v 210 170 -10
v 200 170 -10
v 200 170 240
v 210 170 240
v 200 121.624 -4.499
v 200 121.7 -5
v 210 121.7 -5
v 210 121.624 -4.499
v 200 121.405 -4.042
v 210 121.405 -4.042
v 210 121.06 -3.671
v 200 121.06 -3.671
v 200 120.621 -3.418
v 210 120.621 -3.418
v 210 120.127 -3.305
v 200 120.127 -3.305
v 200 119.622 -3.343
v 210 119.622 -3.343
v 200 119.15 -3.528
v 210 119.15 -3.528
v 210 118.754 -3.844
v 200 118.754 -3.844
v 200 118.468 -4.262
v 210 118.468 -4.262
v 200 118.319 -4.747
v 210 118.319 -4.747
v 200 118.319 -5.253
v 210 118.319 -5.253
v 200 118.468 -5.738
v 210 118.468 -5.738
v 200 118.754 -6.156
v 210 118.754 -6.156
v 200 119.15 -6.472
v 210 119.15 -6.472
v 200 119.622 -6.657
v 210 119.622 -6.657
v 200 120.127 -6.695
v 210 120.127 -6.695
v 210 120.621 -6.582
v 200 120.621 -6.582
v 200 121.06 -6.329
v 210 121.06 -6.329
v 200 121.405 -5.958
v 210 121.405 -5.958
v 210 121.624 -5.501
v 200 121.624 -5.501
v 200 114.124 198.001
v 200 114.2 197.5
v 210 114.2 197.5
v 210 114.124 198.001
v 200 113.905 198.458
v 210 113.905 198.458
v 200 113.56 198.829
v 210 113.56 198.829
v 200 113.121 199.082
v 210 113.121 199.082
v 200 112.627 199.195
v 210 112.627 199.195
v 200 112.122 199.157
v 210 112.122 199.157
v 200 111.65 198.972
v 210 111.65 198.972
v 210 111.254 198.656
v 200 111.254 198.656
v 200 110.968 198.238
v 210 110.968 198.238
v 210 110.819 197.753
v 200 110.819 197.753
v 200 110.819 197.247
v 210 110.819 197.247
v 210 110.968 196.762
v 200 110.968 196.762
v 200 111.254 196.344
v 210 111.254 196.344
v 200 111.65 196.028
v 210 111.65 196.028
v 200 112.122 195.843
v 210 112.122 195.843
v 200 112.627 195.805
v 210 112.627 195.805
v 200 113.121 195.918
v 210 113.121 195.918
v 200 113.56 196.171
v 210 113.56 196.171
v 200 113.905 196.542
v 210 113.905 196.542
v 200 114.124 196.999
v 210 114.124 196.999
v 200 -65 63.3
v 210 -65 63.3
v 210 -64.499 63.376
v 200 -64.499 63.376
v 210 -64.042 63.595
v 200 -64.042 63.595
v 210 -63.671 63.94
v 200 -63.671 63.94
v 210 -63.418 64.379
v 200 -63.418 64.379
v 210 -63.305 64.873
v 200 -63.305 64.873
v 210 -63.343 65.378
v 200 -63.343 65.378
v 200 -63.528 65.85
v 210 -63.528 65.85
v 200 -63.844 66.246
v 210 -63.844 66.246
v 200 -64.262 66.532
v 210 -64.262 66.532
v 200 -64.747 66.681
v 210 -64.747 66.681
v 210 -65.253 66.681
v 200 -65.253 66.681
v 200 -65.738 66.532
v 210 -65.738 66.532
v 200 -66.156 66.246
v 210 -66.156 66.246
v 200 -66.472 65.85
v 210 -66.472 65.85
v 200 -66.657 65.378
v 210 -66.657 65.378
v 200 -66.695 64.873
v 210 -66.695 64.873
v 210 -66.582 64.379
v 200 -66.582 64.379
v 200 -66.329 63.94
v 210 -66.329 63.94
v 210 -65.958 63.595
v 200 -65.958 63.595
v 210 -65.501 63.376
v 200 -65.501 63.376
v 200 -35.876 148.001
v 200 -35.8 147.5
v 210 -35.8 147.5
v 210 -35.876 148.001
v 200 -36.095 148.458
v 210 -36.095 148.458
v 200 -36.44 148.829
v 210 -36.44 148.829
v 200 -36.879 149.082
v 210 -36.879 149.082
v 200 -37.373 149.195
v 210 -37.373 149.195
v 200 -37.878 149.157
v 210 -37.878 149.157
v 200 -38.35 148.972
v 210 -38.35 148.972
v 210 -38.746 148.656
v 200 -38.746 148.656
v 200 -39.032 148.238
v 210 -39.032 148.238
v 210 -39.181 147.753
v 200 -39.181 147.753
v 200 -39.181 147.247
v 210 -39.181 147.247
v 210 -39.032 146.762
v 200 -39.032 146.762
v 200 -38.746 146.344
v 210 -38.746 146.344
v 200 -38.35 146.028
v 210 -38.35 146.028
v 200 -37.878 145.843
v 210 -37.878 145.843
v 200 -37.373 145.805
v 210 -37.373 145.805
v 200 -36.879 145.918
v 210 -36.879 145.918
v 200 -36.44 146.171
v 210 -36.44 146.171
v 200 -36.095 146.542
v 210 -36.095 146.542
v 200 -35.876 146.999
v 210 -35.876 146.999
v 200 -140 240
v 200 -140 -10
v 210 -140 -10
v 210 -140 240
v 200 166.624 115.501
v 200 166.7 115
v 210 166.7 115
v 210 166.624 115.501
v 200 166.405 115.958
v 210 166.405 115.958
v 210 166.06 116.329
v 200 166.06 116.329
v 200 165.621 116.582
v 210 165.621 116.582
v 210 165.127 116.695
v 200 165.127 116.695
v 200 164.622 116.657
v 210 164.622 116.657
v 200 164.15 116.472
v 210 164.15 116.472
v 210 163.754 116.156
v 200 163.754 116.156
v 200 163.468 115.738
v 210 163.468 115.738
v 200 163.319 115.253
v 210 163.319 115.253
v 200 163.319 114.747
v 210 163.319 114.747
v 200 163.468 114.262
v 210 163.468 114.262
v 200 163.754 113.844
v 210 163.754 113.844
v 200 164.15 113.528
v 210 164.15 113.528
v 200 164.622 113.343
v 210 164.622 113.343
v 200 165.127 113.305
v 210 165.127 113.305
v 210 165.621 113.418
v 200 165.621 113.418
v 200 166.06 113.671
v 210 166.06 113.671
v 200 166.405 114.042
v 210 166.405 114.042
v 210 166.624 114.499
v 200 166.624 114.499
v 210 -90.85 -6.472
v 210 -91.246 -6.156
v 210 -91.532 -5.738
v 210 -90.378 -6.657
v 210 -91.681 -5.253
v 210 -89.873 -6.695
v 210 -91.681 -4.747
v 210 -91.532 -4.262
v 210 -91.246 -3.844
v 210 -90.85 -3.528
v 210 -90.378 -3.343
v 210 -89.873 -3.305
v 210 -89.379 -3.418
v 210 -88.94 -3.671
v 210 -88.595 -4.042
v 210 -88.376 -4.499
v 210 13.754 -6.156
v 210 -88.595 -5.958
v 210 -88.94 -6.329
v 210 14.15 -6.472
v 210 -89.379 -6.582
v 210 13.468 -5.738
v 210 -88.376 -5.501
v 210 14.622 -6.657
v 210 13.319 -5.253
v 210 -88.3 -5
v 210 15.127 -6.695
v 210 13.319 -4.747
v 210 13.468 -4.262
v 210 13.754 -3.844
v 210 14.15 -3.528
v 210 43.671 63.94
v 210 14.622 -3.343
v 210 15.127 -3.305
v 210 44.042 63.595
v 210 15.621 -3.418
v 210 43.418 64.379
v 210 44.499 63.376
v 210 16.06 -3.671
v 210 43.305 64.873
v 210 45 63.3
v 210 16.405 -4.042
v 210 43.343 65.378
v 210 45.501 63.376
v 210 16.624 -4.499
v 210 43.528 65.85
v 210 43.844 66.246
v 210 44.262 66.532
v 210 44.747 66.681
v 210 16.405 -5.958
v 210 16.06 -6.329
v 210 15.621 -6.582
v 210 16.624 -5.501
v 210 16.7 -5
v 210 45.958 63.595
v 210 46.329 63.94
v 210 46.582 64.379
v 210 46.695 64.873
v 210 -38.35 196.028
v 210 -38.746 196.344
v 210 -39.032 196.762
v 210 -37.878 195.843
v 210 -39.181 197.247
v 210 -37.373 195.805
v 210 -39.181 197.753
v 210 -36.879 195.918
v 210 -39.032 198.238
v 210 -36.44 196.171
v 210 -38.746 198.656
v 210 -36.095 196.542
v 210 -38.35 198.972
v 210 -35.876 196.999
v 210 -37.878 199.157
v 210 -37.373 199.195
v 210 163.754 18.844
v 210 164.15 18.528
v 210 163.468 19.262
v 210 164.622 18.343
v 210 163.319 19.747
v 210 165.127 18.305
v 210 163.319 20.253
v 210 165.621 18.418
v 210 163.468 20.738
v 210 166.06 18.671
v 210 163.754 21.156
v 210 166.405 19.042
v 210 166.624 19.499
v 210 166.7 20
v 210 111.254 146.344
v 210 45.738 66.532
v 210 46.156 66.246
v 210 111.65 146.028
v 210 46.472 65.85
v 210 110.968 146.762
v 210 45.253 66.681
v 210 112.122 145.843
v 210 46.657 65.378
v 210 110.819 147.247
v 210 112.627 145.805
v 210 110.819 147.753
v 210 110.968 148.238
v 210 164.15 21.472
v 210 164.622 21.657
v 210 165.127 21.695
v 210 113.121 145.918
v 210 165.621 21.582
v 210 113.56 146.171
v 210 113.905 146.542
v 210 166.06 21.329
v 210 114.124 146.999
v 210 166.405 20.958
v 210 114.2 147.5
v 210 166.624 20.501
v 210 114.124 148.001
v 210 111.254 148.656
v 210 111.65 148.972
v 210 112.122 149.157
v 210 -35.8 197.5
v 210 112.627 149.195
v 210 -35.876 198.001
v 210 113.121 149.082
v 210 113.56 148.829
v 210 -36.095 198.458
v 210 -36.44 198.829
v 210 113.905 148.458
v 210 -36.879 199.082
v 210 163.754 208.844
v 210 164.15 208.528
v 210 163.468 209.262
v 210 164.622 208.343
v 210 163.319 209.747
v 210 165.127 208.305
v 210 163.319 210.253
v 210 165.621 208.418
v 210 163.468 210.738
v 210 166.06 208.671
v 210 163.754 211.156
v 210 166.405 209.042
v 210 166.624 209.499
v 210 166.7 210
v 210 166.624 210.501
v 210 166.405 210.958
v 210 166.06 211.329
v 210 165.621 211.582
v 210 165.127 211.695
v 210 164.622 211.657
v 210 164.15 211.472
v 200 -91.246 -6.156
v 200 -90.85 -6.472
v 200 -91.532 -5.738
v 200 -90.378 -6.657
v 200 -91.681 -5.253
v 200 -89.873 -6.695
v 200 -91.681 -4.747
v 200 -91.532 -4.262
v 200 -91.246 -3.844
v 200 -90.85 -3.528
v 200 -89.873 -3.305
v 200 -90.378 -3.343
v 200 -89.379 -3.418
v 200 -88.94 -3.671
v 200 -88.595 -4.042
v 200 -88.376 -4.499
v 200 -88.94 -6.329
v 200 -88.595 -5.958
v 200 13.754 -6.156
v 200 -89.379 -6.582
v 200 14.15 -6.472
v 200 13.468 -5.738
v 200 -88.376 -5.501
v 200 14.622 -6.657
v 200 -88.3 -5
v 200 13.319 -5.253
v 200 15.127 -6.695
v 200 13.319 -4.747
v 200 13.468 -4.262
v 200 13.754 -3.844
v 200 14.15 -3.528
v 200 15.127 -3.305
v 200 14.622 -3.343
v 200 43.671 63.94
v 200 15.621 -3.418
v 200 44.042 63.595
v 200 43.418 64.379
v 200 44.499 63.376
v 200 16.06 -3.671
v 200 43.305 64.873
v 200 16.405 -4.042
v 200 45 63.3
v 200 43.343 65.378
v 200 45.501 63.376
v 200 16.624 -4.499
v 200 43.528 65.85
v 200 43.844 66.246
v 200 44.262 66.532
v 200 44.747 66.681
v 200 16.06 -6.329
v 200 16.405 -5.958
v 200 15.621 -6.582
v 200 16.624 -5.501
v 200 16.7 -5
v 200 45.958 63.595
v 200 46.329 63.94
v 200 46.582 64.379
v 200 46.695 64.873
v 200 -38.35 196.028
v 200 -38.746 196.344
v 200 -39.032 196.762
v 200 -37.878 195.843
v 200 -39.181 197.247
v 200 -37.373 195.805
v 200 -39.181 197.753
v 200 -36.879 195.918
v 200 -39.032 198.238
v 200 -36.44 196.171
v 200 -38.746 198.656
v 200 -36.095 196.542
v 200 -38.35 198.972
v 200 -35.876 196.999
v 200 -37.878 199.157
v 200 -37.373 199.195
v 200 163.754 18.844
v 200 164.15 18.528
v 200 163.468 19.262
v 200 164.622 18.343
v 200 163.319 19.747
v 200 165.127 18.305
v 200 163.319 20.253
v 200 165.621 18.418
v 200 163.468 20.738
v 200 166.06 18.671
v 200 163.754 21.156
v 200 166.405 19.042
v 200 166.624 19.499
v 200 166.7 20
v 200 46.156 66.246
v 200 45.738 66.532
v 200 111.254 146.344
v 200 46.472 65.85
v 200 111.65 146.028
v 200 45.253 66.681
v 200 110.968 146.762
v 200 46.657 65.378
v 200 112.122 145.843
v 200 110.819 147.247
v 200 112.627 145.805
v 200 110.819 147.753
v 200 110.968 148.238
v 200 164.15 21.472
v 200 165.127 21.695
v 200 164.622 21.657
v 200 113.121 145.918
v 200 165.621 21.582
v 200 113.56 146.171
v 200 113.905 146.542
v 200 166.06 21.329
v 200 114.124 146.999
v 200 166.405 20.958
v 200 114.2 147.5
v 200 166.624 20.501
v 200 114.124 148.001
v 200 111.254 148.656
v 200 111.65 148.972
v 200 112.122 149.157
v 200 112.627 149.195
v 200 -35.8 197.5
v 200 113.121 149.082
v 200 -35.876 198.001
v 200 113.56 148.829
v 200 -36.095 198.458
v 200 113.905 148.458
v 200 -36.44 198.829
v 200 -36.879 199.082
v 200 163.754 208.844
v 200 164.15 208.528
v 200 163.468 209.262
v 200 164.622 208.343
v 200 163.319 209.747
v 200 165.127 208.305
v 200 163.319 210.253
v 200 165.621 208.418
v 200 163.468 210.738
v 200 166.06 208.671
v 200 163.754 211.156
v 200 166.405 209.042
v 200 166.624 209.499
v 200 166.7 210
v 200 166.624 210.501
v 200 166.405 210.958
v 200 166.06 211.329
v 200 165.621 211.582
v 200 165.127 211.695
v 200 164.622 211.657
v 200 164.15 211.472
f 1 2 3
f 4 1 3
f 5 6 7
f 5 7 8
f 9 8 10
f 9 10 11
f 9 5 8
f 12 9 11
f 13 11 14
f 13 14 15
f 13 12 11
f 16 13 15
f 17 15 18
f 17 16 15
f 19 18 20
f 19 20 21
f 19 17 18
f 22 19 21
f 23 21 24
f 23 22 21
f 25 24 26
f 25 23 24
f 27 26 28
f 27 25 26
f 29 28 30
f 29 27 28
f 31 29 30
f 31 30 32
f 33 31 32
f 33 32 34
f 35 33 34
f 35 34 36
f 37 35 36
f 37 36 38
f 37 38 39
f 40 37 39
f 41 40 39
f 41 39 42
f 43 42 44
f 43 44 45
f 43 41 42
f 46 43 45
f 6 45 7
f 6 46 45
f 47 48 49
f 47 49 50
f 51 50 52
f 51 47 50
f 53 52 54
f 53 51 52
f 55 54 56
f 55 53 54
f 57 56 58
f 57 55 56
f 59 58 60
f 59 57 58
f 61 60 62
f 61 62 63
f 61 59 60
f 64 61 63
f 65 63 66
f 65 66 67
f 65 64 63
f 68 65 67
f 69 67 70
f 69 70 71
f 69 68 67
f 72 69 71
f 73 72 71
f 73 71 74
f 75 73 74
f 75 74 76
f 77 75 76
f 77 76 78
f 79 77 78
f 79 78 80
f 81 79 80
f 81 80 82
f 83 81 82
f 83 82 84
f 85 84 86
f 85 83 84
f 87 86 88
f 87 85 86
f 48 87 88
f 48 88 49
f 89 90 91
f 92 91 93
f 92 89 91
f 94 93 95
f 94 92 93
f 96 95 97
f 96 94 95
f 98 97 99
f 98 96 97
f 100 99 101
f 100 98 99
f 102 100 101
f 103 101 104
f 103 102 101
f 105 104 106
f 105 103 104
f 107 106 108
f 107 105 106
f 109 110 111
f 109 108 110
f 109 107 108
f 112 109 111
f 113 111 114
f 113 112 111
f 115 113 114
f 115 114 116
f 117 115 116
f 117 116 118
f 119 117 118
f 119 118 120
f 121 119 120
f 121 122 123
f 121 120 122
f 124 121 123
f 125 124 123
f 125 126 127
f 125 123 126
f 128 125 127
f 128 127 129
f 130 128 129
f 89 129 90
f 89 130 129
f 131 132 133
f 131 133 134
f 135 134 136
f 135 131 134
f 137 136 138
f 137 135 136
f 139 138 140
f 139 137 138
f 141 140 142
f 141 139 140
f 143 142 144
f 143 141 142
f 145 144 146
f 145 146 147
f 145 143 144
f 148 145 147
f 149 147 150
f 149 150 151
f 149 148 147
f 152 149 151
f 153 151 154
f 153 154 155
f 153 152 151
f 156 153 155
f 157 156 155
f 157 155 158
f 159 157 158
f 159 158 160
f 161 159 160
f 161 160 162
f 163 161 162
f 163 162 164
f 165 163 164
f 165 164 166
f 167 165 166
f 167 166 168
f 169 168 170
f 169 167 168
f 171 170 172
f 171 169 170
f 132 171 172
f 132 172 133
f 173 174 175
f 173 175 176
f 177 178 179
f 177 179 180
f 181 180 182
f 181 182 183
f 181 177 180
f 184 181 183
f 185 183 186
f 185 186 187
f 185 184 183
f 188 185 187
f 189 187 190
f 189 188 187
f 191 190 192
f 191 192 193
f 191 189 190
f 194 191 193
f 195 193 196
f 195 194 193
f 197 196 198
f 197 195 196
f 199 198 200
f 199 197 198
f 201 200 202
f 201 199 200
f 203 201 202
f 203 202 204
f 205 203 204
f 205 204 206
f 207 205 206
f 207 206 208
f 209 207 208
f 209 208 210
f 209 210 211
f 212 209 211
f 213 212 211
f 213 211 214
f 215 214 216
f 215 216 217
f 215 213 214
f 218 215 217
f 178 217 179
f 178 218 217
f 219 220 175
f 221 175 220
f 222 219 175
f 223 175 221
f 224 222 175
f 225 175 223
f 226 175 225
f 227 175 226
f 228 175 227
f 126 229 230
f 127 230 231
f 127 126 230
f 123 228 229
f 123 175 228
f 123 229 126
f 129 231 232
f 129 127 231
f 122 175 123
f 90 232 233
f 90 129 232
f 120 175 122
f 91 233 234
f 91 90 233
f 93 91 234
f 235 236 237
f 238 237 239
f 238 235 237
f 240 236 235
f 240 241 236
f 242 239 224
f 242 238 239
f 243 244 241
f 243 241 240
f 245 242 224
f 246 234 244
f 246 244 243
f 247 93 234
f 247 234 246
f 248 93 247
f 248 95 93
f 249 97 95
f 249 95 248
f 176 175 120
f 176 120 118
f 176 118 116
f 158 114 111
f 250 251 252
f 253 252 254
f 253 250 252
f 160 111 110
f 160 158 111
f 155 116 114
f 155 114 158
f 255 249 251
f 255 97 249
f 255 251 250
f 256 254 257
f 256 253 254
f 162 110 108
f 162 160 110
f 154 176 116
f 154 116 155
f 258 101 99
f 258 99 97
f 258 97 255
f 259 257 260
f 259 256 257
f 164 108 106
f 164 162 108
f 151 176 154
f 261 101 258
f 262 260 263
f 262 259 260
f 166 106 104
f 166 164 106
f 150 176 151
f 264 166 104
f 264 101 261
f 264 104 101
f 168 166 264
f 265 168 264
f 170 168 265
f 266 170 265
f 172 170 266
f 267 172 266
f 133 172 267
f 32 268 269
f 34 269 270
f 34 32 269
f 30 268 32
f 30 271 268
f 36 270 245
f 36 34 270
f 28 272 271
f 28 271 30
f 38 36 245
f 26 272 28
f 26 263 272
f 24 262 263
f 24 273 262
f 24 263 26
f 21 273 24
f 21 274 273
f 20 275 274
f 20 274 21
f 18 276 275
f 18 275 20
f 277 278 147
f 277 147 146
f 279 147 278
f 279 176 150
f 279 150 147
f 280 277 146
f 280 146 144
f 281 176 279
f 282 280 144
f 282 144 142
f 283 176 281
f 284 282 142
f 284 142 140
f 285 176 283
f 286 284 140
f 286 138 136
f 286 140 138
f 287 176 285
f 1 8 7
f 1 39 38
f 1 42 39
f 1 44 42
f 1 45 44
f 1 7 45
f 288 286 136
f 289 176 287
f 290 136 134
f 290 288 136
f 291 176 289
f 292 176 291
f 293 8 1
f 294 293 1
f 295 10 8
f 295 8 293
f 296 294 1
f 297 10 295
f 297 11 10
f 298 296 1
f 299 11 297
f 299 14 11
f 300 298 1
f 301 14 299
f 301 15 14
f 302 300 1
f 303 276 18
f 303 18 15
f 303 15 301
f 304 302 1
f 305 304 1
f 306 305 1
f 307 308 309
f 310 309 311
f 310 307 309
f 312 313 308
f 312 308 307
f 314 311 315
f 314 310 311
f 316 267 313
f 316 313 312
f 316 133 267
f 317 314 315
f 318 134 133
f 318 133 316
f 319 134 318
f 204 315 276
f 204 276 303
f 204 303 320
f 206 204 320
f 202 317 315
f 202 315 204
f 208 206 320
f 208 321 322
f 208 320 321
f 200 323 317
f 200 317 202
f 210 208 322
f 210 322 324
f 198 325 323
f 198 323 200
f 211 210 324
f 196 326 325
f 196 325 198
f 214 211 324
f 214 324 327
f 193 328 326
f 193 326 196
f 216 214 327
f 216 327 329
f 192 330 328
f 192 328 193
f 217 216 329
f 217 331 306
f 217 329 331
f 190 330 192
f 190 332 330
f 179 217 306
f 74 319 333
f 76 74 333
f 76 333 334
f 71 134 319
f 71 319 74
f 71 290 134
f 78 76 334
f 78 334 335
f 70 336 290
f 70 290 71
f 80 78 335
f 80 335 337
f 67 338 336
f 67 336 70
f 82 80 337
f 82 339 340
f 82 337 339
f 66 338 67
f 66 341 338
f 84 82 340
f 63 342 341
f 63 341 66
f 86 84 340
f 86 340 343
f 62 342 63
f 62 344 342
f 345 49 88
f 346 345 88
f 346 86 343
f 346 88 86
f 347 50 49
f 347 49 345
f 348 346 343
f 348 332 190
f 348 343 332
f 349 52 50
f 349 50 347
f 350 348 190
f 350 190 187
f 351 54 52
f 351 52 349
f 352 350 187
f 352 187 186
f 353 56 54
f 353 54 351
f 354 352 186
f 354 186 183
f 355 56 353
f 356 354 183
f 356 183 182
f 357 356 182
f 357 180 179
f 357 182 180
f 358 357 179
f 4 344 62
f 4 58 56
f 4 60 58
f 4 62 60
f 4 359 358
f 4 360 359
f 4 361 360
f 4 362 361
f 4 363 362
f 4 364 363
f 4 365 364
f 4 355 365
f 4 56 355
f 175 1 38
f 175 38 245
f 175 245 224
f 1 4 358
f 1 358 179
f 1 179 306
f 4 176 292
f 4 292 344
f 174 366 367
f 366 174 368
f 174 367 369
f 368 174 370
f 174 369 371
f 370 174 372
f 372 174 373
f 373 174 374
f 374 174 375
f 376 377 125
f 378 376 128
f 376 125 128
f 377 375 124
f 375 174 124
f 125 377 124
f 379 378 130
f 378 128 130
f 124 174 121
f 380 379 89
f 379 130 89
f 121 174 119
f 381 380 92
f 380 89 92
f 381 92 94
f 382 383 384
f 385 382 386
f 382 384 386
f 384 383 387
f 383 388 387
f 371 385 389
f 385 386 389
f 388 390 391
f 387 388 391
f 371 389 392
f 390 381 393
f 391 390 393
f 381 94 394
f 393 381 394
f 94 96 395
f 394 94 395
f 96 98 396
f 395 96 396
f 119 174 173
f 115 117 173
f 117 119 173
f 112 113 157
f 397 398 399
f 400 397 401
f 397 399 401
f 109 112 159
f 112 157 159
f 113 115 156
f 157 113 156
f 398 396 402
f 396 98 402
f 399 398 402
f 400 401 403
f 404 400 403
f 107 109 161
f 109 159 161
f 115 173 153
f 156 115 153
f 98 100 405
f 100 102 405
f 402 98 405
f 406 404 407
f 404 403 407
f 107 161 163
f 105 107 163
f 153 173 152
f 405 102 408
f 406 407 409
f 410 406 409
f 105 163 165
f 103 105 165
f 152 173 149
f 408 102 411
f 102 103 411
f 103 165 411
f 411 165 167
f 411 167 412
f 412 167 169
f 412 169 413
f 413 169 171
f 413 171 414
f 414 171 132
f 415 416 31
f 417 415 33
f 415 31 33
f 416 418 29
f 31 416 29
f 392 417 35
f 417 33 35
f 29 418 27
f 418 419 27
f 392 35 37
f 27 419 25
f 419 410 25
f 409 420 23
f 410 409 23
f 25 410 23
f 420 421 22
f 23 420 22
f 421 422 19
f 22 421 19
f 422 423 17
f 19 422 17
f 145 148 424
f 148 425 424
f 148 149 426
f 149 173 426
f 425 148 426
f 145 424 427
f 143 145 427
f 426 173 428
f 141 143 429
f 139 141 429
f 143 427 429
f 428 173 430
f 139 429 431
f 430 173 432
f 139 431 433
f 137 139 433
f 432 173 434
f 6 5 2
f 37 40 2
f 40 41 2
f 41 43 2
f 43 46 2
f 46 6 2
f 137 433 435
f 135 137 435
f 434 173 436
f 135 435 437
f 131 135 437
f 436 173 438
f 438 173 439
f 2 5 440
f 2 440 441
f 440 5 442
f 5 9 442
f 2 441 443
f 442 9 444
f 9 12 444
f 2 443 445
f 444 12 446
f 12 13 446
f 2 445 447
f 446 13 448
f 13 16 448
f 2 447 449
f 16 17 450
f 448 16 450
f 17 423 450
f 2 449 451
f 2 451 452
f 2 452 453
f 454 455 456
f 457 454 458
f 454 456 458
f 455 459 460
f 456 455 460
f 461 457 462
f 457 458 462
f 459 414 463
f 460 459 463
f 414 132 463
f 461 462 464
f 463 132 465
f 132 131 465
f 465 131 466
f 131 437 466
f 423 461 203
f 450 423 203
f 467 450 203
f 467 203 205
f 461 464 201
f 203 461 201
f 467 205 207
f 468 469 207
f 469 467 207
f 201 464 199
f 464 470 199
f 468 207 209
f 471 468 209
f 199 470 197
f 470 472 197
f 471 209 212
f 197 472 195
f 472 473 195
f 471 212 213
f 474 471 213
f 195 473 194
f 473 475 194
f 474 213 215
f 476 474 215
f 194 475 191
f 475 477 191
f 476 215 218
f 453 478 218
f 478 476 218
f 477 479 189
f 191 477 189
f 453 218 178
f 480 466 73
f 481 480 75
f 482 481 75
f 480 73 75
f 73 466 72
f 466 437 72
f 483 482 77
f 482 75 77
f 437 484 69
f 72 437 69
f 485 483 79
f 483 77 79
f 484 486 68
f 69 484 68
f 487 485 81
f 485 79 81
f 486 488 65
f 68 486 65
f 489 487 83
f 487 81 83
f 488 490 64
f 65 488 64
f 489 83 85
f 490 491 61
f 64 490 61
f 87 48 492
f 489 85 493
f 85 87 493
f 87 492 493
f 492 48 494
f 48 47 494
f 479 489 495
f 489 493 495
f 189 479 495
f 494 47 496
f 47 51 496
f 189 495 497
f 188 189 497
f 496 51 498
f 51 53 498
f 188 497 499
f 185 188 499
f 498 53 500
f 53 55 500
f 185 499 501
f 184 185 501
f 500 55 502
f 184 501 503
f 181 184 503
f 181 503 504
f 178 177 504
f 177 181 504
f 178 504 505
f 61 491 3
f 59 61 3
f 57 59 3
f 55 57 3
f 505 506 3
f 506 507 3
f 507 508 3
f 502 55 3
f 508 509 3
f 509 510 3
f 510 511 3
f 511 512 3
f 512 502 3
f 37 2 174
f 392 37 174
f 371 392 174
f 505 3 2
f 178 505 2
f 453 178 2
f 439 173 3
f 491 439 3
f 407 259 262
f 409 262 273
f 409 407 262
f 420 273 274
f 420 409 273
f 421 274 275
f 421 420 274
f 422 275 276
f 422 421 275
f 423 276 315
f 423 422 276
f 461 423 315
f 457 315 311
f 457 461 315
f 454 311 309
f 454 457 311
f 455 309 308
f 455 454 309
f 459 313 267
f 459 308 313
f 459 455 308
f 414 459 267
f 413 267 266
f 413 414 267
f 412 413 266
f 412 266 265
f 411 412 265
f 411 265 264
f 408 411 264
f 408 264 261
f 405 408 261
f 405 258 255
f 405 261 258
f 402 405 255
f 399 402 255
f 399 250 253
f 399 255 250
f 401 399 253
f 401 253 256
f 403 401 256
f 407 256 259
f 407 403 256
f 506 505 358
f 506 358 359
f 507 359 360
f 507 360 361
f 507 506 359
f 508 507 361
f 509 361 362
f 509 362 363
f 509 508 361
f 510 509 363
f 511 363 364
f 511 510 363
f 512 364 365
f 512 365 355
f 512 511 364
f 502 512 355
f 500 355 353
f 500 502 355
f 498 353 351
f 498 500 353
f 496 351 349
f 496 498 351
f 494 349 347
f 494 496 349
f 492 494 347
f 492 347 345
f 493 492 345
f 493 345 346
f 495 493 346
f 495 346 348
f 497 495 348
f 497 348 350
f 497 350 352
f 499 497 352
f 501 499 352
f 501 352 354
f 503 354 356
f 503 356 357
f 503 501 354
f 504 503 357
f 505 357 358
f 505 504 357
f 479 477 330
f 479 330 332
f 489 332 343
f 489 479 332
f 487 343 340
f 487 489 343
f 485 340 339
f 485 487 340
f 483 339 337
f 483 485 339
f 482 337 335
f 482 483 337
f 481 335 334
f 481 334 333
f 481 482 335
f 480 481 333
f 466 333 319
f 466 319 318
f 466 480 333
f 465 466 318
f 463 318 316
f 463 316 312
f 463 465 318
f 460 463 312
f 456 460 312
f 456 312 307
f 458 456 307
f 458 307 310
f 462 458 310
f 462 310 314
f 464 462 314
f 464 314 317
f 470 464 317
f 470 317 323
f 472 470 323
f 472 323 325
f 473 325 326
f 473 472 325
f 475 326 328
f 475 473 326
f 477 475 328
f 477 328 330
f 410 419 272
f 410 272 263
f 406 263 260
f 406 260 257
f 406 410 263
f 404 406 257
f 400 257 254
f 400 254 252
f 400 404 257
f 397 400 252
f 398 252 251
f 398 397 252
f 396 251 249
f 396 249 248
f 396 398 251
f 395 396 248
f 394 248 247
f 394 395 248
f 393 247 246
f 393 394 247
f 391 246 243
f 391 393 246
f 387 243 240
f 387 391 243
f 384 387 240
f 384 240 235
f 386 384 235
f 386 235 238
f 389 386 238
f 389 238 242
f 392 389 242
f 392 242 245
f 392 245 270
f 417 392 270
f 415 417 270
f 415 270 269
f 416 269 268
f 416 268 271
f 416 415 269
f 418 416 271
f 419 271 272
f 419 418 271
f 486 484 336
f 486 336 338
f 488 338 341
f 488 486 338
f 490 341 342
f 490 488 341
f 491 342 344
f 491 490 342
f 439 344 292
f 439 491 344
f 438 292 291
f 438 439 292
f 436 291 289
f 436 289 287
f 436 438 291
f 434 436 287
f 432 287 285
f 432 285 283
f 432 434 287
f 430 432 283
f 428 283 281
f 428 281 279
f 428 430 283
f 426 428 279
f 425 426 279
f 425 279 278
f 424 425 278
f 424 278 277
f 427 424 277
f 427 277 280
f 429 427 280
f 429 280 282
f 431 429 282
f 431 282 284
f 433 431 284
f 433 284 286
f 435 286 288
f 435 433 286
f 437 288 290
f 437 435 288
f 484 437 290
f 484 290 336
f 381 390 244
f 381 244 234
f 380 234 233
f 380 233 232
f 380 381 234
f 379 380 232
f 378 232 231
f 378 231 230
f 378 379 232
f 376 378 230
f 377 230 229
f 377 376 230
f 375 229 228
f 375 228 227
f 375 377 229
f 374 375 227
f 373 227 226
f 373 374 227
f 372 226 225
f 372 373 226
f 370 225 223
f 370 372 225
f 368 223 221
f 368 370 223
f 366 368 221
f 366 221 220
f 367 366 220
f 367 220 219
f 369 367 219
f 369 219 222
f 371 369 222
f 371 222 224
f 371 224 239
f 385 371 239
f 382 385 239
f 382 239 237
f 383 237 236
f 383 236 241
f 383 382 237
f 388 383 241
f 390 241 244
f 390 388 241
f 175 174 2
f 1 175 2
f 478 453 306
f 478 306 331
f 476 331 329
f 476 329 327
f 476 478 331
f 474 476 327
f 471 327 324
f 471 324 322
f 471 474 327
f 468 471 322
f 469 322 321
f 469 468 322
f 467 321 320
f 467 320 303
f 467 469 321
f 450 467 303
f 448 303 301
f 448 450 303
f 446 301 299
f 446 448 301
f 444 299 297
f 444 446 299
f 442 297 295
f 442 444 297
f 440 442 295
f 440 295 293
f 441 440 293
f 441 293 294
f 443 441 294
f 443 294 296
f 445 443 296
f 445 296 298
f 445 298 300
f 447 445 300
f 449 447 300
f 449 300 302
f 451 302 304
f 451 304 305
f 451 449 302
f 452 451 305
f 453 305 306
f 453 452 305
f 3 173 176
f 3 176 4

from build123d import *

# Parameters (mm, degrees)
CYLINDER035_R           = 1.7
CYLINDER035_DEPTH       = 20
CYLINDER035_PITCH_ANGLE = 90
CYLINDER034_R           = 1.7
CYLINDER034_DEPTH       = 20
CYLINDER034_PITCH_ANGLE = 90
CYLINDER009_R           = 1.7
CYLINDER009_DEPTH       = 20
CYLINDER005_R           = 1.7
CYLINDER005_DEPTH       = 61
CYLINDER005_PITCH_ANGLE = 90
CYLINDER004_R           = 1.7
CYLINDER004_DEPTH       = 61
CYLINDER004_PITCH_ANGLE = 90
CYLINDER002_R           = 1.7
CYLINDER002_DEPTH       = 61
CYLINDER002_PITCH_ANGLE = 90
BOX_W                   = 50
BOX_H                   = 215
BOX_DEPTH               = 115
CYLINDER006_R           = 1.7
CYLINDER006_DEPTH       = 61
CYLINDER006_PITCH_ANGLE = 90
SKETCH005_W             = 310
SKETCH005_H             = 250
SKETCH005_R             = 1.7
PAD005_DEPTH            = 10
CYLINDER008_R           = 1.7
CYLINDER008_DEPTH       = 20
CYLINDER010_R           = 1.7
CYLINDER010_DEPTH       = 20
CYLINDER010_ROLL_ANGLE  = 90
CYLINDER011_R           = 1.7
CYLINDER011_DEPTH       = 20
CYLINDER011_ROLL_ANGLE  = 90
CYLINDER012_R           = 1.7
CYLINDER012_DEPTH       = 20
CYLINDER012_ROLL_ANGLE  = 90
CYLINDER007_R           = 1.7
CYLINDER007_DEPTH       = 20


with BuildPart() as cylinder035:
    # Cylinder035 → Cylinder035 (new body)
    with BuildSketch(Plane.XY):
        Circle(CYLINDER035_R)
    extrude(amount=CYLINDER035_DEPTH)


with BuildPart() as cylinder035_1:
    # Cylinder035 pitch: moved
    add(cylinder035.part.rotate(Axis((0, 0, 0), (0, 1, 0)), CYLINDER035_PITCH_ANGLE))


with BuildPart() as cylinder035_2:
    # Cylinder035 placement: moved
    add(cylinder035_1.part.moved(Location((200, 45, 65))))


with BuildPart() as fusion010:
    # Cylinder034 → Cylinder034 (new body)
    with BuildSketch(Plane.XY):
        Circle(CYLINDER034_R)
    extrude(amount=CYLINDER034_DEPTH)


with BuildPart() as fusion010_1:
    # Cylinder034 pitch: moved
    add(fusion010.part.rotate(Axis((0, 0, 0), (0, 1, 0)), CYLINDER034_PITCH_ANGLE))


with BuildPart() as fusion010_2:
    # Cylinder034 placement: moved
    add(fusion010_1.part.moved(Location((200, -65, 65))))

    # Fusion010: union Cylinder035
    add(cylinder035_2.part)


with BuildPart() as cylinder009:
    # Cylinder009 → Cylinder009 (new body)
    with BuildSketch(Plane(origin=(205, 120, 235), x_dir=(1, 0, 0), z_dir=(0, 0, 1))):
        Circle(CYLINDER009_R)
    extrude(amount=CYLINDER009_DEPTH)


with BuildPart() as cylinder005:
    # Cylinder005 → Cylinder005 (new body)
    with BuildSketch(Plane.XY):
        Circle(CYLINDER005_R)
    extrude(amount=CYLINDER005_DEPTH)


with BuildPart() as cylinder005_1:
    # Cylinder005 pitch: moved
    add(cylinder005.part.rotate(Axis((0, 0, 0), (0, 1, 0)), CYLINDER005_PITCH_ANGLE))


with BuildPart() as cylinder005_2:
    # Cylinder005 placement: moved
    add(cylinder005_1.part.moved(Location((150, 112.5, 147.5))))


with BuildPart() as cylinder004:
    # Cylinder004 → Cylinder004 (new body)
    with BuildSketch(Plane.XY):
        Circle(CYLINDER004_R)
    extrude(amount=CYLINDER004_DEPTH)


with BuildPart() as cylinder004_1:
    # Cylinder004 pitch: moved
    add(cylinder004.part.rotate(Axis((0, 0, 0), (0, 1, 0)), CYLINDER004_PITCH_ANGLE))


with BuildPart() as cylinder004_2:
    # Cylinder004 placement: moved
    add(cylinder004_1.part.moved(Location((150, -37.5, 197.5))))


with BuildPart() as cylinder002:
    # Cylinder002 → Cylinder002 (new body)
    with BuildSketch(Plane.XY):
        Circle(CYLINDER002_R)
    extrude(amount=CYLINDER002_DEPTH)


with BuildPart() as cylinder002_1:
    # Cylinder002 pitch: moved
    add(cylinder002.part.rotate(Axis((0, 0, 0), (0, 1, 0)), CYLINDER002_PITCH_ANGLE))


with BuildPart() as cylinder002_2:
    # Cylinder002 placement: moved
    add(cylinder002_1.part.moved(Location((150, -37.5, 147.5))))


with BuildPart() as box:
    # Box → Box (new body)
    with BuildSketch(Plane(origin=(150, -70, 115), x_dir=(1, 0, 0), z_dir=(0, 0, 1))):
        with Locations((25, 107.5)):
            Rectangle(BOX_W, BOX_H)
    extrude(amount=BOX_DEPTH)


with BuildPart() as fusion002:
    # Cylinder006 → Cylinder006 (new body)
    with BuildSketch(Plane.XY):
        Circle(CYLINDER006_R)
    extrude(amount=CYLINDER006_DEPTH)


with BuildPart() as fusion002_1:
    # Cylinder006 pitch: moved
    add(fusion002.part.rotate(Axis((0, 0, 0), (0, 1, 0)), CYLINDER006_PITCH_ANGLE))


with BuildPart() as fusion002_2:
    # Cylinder006 placement: moved
    add(fusion002_1.part.moved(Location((150, 112.5, 197.5))))

    # Fusion002: union Cylinder005, Cylinder004, Cylinder002, Box
    add(cylinder005_2.part)
    add(cylinder004_2.part)
    add(cylinder002_2.part)
    add(box.part)


with BuildPart() as cut002:
    # Sketch005 → Pad005 (new body)
    with BuildSketch(Plane.YZ.offset(200)):
        with Locations((15, 115)):
            Rectangle(SKETCH005_W, SKETCH005_H)
        with Locations((165, 210)):
            Circle(SKETCH005_R, mode=Mode.SUBTRACT)
        with Locations((165, 115)):
            Circle(SKETCH005_R, mode=Mode.SUBTRACT)
        with Locations((165, 20)):
            Circle(SKETCH005_R, mode=Mode.SUBTRACT)
        with Locations((120, -5)):
            Circle(SKETCH005_R, mode=Mode.SUBTRACT)
        with Locations((15, -5)):
            Circle(SKETCH005_R, mode=Mode.SUBTRACT)
        with Locations((-90, -5)):
            Circle(SKETCH005_R, mode=Mode.SUBTRACT)
        with Locations((-37.5, 197.5)):
            Circle(SKETCH005_R, mode=Mode.SUBTRACT)
        with Locations((-37.5, 147.5)):
            Circle(SKETCH005_R, mode=Mode.SUBTRACT)
        with Locations((112.5, 147.5)):
            Circle(SKETCH005_R, mode=Mode.SUBTRACT)
        with Locations((112.5, 197.5)):
            Circle(SKETCH005_R, mode=Mode.SUBTRACT)
    extrude(amount=PAD005_DEPTH)

    # Cut002: cut Fusion002
    add(fusion002_2.part, mode=Mode.SUBTRACT)


with BuildPart() as cut007:
    # Cut007 base: copy of Cut002
    add(cut002.part)

    # Cut007: cut Cylinder009
    add(cylinder009.part, mode=Mode.SUBTRACT)


with BuildPart() as cylinder008:
    # Cylinder008 → Cylinder008 (new body)
    with BuildSketch(Plane(origin=(205, 15, 235), x_dir=(1, 0, 0), z_dir=(0, 0, 1))):
        Circle(CYLINDER008_R)
    extrude(amount=CYLINDER008_DEPTH)


with BuildPart() as cut006:
    # Cut006 base: copy of Cut002
    add(cut002.part)

    # Cut006: cut Cylinder008
    add(cylinder008.part, mode=Mode.SUBTRACT)


with BuildPart() as cylinder010:
    # Cylinder010 → Cylinder010 (new body)
    with BuildSketch(Plane.XY):
        Circle(CYLINDER010_R)
    extrude(amount=CYLINDER010_DEPTH)


with BuildPart() as cylinder010_1:
    # Cylinder010 roll: moved
    add(cylinder010.part.rotate(Axis((0, 0, 0), (1, 0, 0)), CYLINDER010_ROLL_ANGLE))


with BuildPart() as cylinder010_2:
    # Cylinder010 placement: moved
    add(cylinder010_1.part.moved(Location((205, -135, 20))))


with BuildPart() as cut008:
    # Cut008 base: copy of Cut002
    add(cut002.part)

    # Cut008: cut Cylinder010
    add(cylinder010_2.part, mode=Mode.SUBTRACT)


with BuildPart() as cylinder011:
    # Cylinder011 → Cylinder011 (new body)
    with BuildSketch(Plane.XY):
        Circle(CYLINDER011_R)
    extrude(amount=CYLINDER011_DEPTH)


with BuildPart() as cylinder011_1:
    # Cylinder011 roll: moved
    add(cylinder011.part.rotate(Axis((0, 0, 0), (1, 0, 0)), CYLINDER011_ROLL_ANGLE))


with BuildPart() as cylinder011_2:
    # Cylinder011 placement: moved
    add(cylinder011_1.part.moved(Location((205, -135, 115))))


with BuildPart() as cut009:
    # Cut009 base: copy of Cut002
    add(cut002.part)

    # Cut009: cut Cylinder011
    add(cylinder011_2.part, mode=Mode.SUBTRACT)


with BuildPart() as cylinder012:
    # Cylinder012 → Cylinder012 (new body)
    with BuildSketch(Plane.XY):
        Circle(CYLINDER012_R)
    extrude(amount=CYLINDER012_DEPTH)


with BuildPart() as cylinder012_1:
    # Cylinder012 roll: moved
    add(cylinder012.part.rotate(Axis((0, 0, 0), (1, 0, 0)), CYLINDER012_ROLL_ANGLE))


with BuildPart() as cylinder012_2:
    # Cylinder012 placement: moved
    add(cylinder012_1.part.moved(Location((205, -135, 210))))


with BuildPart() as ok:
    # Cut010 base: copy of Cut002
    add(cut002.part)

    # Cut010: cut Cylinder012
    add(cylinder012_2.part, mode=Mode.SUBTRACT)


with BuildPart() as cylinder007:
    # Cylinder007 → Cylinder007 (new body)
    with BuildSketch(Plane(origin=(205, -90, 235), x_dir=(1, 0, 0), z_dir=(0, 0, 1))):
        Circle(CYLINDER007_R)
    extrude(amount=CYLINDER007_DEPTH)


with BuildPart() as cut013:
    # Cut005 base: copy of Cut002
    add(cut002.part)

    # Cut005: cut Cylinder007
    add(cylinder007.part, mode=Mode.SUBTRACT)

    # Fusion003: union Cut007, Cut006, Cut008, Cut009, ok
    add(cut007.part)
    add(cut006.part)
    add(cut008.part)
    add(cut009.part)
    add(ok.part)

    # Cut013: cut Fusion010
    add(fusion010_2.part, mode=Mode.SUBTRACT)


solid = cut013.part
